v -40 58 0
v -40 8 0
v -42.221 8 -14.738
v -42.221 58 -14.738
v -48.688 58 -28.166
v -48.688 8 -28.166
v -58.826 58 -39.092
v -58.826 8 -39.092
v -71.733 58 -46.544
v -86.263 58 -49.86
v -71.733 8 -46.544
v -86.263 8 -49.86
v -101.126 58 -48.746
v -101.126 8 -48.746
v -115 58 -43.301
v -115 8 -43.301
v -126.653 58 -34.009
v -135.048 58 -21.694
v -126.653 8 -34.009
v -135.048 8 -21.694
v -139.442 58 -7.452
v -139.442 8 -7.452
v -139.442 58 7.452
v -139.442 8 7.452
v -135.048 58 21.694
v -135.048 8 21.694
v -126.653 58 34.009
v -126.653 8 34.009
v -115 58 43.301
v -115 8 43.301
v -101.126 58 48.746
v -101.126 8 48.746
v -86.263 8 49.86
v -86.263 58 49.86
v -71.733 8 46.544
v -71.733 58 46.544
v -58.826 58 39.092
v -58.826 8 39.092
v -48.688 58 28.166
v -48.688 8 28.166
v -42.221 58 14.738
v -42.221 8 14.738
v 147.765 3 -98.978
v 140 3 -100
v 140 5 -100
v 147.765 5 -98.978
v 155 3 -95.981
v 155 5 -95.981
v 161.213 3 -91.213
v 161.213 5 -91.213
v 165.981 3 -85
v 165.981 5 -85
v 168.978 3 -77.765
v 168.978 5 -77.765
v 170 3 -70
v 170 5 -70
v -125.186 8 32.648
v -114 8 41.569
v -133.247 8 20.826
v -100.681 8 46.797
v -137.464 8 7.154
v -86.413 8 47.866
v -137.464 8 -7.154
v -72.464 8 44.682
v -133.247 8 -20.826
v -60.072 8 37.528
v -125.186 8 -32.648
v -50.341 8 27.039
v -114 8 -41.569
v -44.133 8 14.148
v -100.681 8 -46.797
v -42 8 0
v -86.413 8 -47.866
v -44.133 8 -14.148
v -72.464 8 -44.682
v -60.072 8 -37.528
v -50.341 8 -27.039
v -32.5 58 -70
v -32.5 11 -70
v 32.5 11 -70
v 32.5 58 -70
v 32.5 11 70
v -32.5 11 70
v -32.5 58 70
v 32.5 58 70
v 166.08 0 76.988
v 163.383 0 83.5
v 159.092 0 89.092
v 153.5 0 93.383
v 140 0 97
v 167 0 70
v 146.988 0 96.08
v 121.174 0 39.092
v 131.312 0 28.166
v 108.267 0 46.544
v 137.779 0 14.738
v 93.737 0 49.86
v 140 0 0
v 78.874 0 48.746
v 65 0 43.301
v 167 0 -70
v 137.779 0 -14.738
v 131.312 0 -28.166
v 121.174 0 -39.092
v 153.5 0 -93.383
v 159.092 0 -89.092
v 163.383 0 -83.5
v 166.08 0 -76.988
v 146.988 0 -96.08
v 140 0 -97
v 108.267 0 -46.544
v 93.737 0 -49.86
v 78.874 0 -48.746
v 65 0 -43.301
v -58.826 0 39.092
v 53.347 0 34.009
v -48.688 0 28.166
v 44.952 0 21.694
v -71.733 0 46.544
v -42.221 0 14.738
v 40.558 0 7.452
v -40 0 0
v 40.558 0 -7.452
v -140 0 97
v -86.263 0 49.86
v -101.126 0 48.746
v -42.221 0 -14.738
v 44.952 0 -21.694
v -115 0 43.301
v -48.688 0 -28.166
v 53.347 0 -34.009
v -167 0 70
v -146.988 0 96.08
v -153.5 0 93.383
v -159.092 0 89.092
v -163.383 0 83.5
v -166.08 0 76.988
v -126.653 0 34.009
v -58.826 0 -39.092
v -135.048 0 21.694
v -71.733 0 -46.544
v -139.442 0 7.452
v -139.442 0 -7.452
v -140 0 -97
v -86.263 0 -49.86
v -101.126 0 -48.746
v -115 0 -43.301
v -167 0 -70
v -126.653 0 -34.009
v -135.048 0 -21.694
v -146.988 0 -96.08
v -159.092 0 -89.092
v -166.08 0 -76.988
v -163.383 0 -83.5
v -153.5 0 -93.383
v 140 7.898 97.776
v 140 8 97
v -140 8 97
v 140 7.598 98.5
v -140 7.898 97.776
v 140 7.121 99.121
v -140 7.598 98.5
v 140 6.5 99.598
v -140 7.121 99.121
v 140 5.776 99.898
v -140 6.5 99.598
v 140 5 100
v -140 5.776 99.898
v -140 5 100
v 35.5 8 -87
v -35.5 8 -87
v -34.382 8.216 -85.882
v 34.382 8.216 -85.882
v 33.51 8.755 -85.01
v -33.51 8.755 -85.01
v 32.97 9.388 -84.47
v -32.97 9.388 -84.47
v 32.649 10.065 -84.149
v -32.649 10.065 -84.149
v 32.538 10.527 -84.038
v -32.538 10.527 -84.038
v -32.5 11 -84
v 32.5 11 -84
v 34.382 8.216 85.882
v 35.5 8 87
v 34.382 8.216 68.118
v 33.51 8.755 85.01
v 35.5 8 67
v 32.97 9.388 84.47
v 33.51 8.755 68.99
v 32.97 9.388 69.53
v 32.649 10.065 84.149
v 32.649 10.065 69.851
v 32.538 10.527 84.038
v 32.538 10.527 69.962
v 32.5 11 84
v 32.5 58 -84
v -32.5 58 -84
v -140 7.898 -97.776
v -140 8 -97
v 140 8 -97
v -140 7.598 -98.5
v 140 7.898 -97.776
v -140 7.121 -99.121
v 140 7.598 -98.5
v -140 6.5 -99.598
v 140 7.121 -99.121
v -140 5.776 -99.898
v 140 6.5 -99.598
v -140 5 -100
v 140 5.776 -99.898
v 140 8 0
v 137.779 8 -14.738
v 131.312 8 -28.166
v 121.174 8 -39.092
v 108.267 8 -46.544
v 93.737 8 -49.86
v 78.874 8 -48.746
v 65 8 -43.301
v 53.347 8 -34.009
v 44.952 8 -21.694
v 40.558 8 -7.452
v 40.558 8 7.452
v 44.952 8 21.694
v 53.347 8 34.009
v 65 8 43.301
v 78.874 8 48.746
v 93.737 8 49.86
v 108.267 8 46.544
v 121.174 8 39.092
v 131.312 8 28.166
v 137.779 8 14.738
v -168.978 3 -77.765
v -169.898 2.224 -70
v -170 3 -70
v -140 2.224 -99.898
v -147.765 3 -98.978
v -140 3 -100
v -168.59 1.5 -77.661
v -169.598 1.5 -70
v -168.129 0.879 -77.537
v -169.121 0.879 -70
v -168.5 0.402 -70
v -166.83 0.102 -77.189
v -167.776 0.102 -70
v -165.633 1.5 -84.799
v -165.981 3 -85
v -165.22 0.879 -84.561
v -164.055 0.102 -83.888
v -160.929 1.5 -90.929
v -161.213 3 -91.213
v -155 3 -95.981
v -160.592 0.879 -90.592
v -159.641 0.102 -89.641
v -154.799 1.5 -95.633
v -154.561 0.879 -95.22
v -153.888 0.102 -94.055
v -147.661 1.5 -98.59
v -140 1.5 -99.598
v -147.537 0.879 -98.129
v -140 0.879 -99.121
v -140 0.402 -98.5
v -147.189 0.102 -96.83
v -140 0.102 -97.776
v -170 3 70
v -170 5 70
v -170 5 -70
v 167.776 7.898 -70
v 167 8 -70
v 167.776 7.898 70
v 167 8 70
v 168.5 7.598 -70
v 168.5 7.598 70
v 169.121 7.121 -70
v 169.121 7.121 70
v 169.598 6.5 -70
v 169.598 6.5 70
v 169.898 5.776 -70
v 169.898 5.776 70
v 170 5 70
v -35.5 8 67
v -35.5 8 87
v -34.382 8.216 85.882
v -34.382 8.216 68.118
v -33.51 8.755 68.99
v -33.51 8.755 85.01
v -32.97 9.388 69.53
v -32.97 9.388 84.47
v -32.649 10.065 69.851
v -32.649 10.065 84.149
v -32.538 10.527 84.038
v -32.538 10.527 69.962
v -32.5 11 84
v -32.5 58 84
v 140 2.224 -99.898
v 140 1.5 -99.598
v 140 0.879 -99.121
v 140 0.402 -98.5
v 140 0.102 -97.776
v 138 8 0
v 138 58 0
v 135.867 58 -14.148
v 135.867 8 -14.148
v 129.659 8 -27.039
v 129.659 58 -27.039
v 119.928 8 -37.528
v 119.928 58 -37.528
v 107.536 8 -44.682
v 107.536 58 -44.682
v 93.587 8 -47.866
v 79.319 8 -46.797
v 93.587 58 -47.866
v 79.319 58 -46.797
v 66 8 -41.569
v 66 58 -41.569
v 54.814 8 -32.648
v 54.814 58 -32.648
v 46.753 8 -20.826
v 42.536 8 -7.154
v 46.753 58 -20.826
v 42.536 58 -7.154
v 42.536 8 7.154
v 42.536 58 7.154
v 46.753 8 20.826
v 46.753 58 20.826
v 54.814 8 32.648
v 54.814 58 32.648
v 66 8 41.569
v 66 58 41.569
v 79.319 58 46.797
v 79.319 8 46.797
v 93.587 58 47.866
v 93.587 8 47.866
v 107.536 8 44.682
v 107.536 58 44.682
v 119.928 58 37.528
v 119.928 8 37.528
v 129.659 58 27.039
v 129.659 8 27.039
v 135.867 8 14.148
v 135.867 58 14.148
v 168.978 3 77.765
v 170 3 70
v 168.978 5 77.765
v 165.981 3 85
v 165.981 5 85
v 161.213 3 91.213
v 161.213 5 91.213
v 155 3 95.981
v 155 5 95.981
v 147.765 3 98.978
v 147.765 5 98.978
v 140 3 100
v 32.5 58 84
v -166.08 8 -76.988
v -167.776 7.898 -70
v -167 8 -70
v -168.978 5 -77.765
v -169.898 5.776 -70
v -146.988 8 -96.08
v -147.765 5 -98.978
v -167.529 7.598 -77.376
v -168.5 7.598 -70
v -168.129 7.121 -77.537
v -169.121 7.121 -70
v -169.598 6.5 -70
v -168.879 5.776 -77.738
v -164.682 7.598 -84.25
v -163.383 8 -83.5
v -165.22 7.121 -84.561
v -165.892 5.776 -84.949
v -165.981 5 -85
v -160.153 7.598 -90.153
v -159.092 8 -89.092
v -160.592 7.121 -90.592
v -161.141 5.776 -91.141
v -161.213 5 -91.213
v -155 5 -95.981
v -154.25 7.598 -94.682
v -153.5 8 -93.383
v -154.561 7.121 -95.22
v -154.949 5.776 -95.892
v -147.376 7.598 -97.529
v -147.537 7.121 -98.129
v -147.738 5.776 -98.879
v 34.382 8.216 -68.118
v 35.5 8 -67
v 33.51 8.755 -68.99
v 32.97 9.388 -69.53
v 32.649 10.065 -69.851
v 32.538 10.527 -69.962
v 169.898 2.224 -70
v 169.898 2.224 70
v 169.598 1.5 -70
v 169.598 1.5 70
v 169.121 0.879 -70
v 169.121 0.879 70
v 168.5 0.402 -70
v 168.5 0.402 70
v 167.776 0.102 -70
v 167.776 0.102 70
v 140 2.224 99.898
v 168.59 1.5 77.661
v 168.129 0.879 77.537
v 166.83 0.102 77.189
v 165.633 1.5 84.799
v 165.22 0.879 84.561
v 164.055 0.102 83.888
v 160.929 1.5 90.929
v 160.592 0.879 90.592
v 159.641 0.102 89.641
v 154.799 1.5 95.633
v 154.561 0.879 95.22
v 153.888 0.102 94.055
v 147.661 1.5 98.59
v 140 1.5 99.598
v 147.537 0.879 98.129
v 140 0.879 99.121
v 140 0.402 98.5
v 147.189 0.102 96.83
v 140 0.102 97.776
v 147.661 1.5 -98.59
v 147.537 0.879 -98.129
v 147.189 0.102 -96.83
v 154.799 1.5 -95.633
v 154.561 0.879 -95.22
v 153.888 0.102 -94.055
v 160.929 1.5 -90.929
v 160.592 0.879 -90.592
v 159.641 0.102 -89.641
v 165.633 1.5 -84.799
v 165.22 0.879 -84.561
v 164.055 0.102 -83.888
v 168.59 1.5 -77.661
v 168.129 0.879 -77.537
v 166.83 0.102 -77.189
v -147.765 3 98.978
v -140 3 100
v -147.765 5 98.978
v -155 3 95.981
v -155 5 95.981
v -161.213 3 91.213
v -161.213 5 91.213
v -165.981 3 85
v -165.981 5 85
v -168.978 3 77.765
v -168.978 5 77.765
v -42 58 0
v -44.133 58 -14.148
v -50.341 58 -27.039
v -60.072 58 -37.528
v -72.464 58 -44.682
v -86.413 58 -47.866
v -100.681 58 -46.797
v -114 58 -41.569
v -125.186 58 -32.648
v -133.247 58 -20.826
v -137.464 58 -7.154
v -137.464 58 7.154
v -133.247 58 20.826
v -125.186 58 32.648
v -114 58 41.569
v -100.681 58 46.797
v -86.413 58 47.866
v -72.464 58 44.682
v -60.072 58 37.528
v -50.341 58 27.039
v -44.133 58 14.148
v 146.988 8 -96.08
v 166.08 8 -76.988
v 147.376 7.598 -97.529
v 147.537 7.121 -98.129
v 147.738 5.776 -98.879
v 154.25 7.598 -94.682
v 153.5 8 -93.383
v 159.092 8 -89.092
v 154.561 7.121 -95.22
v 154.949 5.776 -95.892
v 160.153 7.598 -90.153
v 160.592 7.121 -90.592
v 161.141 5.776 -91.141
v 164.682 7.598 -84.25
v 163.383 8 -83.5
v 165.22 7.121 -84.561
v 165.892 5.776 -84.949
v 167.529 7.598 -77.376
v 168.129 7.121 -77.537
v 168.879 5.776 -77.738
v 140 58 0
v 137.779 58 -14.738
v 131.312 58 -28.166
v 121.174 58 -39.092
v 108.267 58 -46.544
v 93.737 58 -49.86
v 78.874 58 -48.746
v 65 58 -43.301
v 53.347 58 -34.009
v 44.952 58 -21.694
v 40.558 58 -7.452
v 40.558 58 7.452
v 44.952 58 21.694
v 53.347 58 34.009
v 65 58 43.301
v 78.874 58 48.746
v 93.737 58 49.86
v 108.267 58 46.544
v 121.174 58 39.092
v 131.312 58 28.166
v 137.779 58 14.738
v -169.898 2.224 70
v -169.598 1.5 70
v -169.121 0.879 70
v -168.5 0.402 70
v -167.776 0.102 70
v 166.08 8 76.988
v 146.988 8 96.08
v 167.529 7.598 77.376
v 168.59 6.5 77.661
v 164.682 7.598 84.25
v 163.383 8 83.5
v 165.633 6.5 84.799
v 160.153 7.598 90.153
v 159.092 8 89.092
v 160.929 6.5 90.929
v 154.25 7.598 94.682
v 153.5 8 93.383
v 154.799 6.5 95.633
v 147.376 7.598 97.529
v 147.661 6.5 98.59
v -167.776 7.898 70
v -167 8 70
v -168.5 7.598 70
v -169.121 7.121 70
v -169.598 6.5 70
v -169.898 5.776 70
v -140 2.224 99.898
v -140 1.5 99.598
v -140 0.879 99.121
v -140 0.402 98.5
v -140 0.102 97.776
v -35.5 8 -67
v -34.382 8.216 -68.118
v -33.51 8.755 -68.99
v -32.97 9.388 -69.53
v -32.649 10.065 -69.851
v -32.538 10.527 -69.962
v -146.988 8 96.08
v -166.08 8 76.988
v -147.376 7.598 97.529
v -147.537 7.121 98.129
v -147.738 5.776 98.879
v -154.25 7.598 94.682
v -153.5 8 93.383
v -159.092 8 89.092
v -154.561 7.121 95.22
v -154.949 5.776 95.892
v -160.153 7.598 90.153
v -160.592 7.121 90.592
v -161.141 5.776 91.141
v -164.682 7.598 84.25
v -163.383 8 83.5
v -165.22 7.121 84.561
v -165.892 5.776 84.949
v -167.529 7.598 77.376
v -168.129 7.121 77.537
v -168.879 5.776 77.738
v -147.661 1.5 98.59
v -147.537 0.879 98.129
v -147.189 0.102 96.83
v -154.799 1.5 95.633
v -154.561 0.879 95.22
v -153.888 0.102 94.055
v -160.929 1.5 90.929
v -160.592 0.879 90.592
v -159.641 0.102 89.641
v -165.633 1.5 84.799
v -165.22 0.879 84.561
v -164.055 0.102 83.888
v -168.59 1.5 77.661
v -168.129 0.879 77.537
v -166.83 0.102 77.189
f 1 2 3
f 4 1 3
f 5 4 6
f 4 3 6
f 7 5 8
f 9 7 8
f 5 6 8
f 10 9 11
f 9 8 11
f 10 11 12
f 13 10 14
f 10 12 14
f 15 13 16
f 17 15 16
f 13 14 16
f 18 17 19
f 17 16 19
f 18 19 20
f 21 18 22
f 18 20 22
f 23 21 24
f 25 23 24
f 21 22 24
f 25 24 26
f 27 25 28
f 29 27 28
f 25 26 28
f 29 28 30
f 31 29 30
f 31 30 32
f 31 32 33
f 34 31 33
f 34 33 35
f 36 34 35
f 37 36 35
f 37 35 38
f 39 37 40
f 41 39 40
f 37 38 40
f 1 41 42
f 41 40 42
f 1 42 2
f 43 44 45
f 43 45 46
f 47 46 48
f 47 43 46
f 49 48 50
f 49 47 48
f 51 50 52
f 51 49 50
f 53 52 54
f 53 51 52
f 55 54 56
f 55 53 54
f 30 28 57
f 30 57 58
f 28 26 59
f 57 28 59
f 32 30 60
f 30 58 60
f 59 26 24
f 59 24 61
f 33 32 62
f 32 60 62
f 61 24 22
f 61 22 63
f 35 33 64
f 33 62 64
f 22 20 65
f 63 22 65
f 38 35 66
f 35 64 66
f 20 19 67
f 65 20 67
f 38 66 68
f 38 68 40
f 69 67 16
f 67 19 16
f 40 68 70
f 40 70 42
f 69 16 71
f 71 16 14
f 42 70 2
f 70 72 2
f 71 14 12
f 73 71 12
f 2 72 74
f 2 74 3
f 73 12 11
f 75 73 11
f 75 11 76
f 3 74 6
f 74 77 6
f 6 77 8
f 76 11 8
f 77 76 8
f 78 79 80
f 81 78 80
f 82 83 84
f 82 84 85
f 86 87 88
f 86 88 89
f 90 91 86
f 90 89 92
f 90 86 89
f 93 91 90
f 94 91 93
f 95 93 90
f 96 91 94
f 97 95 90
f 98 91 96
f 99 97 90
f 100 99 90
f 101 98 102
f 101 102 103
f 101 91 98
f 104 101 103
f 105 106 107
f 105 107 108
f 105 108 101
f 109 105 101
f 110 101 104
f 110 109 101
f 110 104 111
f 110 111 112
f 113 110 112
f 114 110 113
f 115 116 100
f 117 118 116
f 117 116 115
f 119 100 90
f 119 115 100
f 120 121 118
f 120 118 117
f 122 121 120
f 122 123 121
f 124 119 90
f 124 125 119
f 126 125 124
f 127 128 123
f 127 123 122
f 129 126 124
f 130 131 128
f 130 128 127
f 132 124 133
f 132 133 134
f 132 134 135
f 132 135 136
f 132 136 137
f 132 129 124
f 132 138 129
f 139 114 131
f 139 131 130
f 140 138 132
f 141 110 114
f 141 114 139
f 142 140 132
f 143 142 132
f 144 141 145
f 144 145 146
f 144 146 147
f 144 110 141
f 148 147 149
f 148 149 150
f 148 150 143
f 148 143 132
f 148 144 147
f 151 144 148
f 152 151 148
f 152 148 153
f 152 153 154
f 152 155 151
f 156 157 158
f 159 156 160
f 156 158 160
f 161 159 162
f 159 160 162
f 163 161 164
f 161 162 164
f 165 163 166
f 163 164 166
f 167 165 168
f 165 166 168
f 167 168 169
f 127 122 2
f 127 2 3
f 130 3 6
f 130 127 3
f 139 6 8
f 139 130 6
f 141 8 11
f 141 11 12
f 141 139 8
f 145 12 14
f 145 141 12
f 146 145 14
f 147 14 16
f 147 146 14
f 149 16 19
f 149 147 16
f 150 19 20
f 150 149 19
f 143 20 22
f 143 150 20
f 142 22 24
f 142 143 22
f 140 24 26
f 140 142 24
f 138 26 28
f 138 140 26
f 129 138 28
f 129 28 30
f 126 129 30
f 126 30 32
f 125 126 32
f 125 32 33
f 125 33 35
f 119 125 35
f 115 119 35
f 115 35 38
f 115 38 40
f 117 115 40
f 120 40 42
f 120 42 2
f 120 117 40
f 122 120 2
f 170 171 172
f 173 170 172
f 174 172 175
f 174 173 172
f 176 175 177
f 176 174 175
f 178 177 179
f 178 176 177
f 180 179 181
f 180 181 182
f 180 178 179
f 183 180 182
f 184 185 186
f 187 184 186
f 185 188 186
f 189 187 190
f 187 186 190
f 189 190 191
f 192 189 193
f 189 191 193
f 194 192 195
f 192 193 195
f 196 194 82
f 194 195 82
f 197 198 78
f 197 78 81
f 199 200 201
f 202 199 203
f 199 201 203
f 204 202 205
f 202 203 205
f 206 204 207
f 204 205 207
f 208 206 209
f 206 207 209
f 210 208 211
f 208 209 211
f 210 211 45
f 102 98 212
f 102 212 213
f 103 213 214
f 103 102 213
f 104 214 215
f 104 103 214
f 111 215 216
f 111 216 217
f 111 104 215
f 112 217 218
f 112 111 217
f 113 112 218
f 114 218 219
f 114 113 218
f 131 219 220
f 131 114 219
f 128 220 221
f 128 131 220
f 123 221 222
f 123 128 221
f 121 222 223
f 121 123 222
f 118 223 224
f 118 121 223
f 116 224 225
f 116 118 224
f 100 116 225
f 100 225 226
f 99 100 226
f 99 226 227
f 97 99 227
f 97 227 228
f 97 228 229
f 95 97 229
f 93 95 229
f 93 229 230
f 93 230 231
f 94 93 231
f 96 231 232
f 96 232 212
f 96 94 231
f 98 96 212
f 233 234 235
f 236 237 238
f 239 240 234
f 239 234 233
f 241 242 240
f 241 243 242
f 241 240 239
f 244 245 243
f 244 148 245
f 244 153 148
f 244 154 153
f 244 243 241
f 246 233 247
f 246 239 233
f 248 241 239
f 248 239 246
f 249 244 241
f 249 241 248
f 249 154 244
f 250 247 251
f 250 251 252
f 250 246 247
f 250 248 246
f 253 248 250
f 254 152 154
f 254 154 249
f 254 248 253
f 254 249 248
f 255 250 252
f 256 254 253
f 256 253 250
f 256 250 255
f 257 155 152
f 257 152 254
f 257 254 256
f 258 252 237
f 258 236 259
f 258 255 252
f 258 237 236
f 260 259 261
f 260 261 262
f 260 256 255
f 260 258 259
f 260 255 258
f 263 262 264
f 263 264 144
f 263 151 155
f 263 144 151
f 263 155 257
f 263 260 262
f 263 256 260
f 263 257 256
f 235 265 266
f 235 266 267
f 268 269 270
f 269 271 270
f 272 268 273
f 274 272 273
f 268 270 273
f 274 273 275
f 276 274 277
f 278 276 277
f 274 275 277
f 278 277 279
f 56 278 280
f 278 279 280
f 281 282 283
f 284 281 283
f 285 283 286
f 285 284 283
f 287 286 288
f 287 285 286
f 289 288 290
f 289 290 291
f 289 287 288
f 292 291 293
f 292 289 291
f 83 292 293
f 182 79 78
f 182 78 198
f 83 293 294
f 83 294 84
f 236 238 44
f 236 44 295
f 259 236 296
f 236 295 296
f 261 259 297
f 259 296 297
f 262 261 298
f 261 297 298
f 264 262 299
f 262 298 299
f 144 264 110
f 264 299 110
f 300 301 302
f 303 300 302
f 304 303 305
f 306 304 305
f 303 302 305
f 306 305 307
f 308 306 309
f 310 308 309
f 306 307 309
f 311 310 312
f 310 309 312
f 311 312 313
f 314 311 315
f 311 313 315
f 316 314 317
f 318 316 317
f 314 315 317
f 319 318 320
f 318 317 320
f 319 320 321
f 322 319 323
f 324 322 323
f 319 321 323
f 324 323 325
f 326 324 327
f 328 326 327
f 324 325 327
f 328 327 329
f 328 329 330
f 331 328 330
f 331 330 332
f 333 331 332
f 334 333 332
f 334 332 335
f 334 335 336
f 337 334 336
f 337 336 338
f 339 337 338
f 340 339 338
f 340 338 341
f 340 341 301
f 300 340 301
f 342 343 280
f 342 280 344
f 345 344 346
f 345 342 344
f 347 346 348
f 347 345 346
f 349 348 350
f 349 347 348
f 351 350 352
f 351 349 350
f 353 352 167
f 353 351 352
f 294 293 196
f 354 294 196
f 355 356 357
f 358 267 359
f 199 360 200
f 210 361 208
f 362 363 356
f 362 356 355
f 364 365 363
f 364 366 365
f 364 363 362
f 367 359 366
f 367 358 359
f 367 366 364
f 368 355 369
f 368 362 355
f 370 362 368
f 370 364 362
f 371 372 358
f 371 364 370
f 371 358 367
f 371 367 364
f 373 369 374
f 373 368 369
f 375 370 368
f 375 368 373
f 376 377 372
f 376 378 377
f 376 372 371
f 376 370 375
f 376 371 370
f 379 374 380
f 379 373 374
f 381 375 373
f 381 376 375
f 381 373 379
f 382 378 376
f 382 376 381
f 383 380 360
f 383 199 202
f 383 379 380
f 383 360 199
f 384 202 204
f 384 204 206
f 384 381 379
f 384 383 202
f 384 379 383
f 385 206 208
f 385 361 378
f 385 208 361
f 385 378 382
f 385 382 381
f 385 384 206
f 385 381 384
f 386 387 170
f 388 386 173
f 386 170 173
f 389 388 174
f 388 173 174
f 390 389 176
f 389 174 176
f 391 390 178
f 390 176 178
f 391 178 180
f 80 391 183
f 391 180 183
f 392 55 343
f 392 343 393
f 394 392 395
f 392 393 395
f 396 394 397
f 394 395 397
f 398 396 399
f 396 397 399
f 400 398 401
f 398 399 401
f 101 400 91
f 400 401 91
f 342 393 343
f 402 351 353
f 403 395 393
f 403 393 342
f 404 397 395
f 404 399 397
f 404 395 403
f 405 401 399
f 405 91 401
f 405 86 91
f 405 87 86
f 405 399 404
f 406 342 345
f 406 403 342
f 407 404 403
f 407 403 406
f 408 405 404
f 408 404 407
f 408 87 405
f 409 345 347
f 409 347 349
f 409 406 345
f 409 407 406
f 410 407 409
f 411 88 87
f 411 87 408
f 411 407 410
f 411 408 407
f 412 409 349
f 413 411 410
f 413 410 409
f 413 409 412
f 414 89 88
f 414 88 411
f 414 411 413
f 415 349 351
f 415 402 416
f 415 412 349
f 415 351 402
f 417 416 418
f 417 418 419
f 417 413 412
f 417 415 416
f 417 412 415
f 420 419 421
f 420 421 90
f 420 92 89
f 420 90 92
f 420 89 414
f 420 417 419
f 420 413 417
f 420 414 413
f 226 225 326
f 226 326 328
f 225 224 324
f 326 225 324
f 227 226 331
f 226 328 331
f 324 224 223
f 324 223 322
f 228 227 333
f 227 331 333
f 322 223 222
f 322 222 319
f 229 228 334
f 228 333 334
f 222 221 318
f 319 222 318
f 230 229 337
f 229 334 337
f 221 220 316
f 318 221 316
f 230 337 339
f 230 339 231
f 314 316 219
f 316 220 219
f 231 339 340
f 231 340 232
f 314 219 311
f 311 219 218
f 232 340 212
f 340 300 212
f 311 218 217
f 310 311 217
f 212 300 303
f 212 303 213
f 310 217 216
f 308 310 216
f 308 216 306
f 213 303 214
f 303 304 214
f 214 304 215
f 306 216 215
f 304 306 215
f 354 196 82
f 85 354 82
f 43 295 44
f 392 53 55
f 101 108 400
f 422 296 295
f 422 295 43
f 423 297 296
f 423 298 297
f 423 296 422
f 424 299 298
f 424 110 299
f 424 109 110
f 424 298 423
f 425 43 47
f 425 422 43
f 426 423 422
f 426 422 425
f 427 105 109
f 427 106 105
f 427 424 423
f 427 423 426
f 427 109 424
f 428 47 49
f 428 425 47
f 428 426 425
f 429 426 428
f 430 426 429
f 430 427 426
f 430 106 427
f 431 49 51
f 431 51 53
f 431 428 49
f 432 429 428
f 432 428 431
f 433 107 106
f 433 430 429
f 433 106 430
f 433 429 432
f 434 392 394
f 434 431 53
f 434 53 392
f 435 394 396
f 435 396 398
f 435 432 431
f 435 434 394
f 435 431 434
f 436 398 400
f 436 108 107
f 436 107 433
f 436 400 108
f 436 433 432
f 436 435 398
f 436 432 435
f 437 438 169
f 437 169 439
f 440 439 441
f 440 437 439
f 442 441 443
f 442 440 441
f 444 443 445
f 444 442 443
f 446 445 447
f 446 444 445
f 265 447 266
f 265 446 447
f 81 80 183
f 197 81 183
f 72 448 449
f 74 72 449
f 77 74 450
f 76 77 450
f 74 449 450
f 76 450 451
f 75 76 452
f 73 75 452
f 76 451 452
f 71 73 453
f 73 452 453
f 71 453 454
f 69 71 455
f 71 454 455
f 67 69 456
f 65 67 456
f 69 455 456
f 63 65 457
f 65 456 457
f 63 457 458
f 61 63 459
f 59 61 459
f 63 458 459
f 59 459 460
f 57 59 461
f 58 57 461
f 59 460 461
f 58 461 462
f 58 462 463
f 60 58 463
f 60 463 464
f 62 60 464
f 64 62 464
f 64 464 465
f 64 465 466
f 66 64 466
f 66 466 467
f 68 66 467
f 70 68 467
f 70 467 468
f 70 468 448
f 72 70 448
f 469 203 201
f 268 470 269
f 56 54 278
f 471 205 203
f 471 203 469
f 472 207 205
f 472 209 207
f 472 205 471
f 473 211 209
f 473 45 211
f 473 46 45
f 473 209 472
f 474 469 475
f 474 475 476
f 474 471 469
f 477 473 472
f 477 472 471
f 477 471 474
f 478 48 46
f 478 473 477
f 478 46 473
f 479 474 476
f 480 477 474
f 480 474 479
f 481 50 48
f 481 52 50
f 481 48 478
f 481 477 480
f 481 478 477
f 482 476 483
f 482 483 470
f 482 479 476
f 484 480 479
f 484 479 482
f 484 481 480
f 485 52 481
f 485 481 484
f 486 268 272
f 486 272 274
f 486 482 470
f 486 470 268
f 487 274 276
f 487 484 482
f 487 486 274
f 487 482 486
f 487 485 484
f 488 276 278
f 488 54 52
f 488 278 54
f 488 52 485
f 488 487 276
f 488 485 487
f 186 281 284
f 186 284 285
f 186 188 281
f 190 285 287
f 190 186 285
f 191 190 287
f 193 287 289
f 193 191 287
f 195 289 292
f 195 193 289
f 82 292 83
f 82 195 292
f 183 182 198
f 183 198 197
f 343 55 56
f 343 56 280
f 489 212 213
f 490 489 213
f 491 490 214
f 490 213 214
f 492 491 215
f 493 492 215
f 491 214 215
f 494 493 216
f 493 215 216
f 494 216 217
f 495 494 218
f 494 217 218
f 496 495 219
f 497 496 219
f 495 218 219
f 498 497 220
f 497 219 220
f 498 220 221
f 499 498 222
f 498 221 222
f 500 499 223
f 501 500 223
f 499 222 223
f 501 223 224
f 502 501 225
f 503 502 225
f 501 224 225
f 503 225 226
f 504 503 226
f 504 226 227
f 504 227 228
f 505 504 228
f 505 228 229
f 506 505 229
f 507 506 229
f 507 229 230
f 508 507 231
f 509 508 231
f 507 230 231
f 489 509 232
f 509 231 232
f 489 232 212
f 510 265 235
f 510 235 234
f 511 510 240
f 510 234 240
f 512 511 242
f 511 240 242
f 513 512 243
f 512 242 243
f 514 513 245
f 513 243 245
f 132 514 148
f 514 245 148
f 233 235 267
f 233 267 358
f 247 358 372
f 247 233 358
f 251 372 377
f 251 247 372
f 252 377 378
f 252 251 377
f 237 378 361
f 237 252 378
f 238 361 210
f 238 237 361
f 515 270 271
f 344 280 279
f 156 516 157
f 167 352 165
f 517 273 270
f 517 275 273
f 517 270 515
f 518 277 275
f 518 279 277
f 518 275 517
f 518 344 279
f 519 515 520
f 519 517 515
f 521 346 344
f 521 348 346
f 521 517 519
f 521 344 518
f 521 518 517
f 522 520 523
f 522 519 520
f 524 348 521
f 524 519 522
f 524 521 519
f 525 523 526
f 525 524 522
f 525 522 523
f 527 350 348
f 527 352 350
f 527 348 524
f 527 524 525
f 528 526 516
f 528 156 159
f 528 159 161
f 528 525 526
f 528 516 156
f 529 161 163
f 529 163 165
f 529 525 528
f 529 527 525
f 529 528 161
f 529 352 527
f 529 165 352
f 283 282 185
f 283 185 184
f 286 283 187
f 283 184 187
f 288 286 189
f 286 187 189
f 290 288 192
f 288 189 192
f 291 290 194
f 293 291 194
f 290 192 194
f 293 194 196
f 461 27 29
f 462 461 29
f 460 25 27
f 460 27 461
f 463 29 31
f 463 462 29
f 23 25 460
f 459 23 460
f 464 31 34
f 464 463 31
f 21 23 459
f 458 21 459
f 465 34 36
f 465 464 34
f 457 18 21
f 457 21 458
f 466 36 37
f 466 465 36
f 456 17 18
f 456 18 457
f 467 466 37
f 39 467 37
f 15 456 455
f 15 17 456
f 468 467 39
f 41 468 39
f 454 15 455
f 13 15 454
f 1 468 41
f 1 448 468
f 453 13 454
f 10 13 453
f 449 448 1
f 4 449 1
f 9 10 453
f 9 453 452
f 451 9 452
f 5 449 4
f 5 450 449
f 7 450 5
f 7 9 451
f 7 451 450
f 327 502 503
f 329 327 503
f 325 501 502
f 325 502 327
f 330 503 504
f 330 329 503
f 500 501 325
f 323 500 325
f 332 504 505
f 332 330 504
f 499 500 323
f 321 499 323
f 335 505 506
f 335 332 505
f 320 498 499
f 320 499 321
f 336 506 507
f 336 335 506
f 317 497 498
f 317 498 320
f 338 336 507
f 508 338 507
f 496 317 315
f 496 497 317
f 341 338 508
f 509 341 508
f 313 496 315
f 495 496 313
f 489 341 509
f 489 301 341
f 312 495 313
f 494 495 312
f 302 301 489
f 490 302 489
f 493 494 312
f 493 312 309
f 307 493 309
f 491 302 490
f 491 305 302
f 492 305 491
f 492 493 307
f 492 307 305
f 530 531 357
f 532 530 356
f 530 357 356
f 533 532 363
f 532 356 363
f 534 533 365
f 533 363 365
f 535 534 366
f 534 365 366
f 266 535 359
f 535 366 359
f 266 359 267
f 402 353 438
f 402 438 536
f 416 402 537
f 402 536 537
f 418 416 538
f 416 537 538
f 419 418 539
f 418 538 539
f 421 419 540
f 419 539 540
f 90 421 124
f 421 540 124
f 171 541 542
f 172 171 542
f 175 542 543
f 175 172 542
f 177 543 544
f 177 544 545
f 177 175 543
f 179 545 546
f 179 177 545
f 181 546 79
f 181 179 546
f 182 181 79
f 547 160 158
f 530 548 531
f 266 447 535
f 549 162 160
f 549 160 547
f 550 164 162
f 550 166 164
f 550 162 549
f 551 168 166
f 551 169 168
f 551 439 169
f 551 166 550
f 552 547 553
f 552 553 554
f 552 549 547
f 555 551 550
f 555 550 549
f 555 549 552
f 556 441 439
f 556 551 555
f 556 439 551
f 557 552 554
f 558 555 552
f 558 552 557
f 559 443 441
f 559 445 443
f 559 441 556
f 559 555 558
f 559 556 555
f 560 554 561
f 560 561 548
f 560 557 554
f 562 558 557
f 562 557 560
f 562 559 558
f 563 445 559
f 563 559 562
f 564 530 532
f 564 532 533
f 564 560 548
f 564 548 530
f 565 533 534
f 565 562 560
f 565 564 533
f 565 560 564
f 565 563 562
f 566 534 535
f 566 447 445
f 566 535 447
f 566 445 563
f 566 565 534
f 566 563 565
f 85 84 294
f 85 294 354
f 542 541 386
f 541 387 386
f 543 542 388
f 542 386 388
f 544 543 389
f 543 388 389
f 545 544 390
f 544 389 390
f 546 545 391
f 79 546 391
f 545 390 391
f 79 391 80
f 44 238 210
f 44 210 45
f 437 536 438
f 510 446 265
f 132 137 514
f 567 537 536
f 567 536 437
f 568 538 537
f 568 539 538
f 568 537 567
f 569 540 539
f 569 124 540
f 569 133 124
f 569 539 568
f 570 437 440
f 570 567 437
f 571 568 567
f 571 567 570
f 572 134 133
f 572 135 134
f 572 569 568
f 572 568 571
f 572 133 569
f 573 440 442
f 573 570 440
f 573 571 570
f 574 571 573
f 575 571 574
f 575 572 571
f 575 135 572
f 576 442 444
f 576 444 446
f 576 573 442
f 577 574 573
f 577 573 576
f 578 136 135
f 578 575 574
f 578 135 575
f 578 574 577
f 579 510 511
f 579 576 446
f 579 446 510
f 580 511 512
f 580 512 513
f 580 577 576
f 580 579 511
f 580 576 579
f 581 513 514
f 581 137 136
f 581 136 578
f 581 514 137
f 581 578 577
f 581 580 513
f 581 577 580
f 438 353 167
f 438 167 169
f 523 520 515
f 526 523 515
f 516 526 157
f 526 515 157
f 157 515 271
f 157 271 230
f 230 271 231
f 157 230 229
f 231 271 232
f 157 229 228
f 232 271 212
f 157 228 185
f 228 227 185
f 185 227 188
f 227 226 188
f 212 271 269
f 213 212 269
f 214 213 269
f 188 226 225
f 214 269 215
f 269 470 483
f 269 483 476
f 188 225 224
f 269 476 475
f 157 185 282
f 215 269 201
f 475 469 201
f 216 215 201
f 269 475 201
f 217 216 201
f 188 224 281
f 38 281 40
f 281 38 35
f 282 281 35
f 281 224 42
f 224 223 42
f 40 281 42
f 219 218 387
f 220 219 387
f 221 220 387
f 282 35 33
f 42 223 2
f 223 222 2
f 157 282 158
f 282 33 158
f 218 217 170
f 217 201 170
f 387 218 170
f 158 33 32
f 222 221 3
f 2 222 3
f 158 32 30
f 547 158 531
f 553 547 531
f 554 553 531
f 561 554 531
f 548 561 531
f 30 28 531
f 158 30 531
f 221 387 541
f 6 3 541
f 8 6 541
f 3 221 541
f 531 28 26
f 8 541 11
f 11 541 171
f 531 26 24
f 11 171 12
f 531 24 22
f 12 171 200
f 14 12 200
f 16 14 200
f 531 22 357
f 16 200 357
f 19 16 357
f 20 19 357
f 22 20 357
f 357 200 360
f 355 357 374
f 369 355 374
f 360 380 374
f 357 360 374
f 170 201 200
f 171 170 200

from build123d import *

# Parameters (mm, degrees)
SKETCH1_R           = 50
BOSS_EXTRUDE1_DEPTH = 8
SKETCH2_R           = 50
SKETCH2_W           = 65
SKETCH2_H           = 14
BOSS_EXTRUDE2_DEPTH = 50
SKETCH4_R           = 48
CUT_EXTRUDE1_DEPTH  = 59
FILLET2_R           = 3
FILLET3_R           = 3


with BuildPart() as part:
    # Sketch1 → Boss-Extrude1 (new body)
    with BuildSketch(Plane(origin=(0, 0, 0), x_dir=(1, 0, 0), z_dir=(0, 1, 0))):
        with BuildLine():
            Line((-140, 100), (140, 100))
            ThreePointArc((140, 100), (161.213203436, 91.213203436), (170, 70))
            Line((170, 70), (170, -70))
            ThreePointArc((170, -70), (161.213203436, -91.213203436), (140, -100))
            Line((140, -100), (-140, -100))
            ThreePointArc((-140, -100), (-161.213203436, -91.213203436), (-170, -70))
            Line((-170, -70), (-170, 70))
            ThreePointArc((-170, 70), (-161.213203436, 91.213203436), (-140, 100))
        make_face()
        with Locations((-90, 0)):
            Circle(SKETCH1_R, mode=Mode.SUBTRACT)
        with Locations((90, 0)):
            Circle(SKETCH1_R, mode=Mode.SUBTRACT)
    extrude(amount=BOSS_EXTRUDE1_DEPTH)

    # Sketch2 → Boss-Extrude2 (add)
    with BuildSketch(Plane(origin=(0, 8, 0), x_dir=(1, 0, 0), z_dir=(0, 1, 0))):
        with Locations((-90, 0)):
            Circle(SKETCH2_R)
        with Locations((90, 0)):
            Circle(SKETCH2_R)
        with Locations((0, -77)):
            Rectangle(SKETCH2_W, SKETCH2_H)
        with Locations((0, 77)):
            Rectangle(SKETCH2_W, SKETCH2_H)
    extrude(amount=BOSS_EXTRUDE2_DEPTH)

    # Sketch4 → Cut-Extrude1 (cut, through all)
    with BuildSketch(Plane(origin=(0, 58, 0), x_dir=(1, 0, 0), z_dir=(0, 1, 0))):
        with Locations((-90, 0)):
            Circle(SKETCH4_R)
        with Locations((90, 0)):
            Circle(SKETCH4_R)
    extrude(amount=-CUT_EXTRUDE1_DEPTH, mode=Mode.SUBTRACT)

    # Fillet2
    fillet2_edges = [part.edges().sort_by_distance(p)[0] for p in [
        (32.5, 8, -77),
        (0, 8, -84),
        (-32.5, 8, -77),
        (0, 8, -70),
        (-32.5, 8, 77),
        (0, 8, 84),
        (32.5, 8, 77),
        (0, 8, 70),
    ]]
    fillet(fillet2_edges, radius=FILLET2_R)

    # Fillet3
    fillet3_edges = [part.edges().sort_by_distance(p)[0] for p in [
        (170, 0, 0),
        (161.213203436, 0, 91.213203436),
        (0, 0, 100),
        (-161.213203436, 0, 91.213203436),
        (161.213203436, 8, 91.213203436),
        (170, 8, 0),
        (161.213203436, 8, -91.213203436),
        (0, 8, -100),
        (-161.213203436, 8, -91.213203436),
        (-170, 8, 0),
        (-161.213203436, 8, 91.213203436),
        (-170, 0, 0),
        (0, 8, 100),
        (-161.213203436, 0, -91.213203436),
        (0, 0, -100),
        (161.213203436, 0, -91.213203436),
    ]]
    fillet(fillet3_edges, radius=FILLET3_R)


solid = part.part
